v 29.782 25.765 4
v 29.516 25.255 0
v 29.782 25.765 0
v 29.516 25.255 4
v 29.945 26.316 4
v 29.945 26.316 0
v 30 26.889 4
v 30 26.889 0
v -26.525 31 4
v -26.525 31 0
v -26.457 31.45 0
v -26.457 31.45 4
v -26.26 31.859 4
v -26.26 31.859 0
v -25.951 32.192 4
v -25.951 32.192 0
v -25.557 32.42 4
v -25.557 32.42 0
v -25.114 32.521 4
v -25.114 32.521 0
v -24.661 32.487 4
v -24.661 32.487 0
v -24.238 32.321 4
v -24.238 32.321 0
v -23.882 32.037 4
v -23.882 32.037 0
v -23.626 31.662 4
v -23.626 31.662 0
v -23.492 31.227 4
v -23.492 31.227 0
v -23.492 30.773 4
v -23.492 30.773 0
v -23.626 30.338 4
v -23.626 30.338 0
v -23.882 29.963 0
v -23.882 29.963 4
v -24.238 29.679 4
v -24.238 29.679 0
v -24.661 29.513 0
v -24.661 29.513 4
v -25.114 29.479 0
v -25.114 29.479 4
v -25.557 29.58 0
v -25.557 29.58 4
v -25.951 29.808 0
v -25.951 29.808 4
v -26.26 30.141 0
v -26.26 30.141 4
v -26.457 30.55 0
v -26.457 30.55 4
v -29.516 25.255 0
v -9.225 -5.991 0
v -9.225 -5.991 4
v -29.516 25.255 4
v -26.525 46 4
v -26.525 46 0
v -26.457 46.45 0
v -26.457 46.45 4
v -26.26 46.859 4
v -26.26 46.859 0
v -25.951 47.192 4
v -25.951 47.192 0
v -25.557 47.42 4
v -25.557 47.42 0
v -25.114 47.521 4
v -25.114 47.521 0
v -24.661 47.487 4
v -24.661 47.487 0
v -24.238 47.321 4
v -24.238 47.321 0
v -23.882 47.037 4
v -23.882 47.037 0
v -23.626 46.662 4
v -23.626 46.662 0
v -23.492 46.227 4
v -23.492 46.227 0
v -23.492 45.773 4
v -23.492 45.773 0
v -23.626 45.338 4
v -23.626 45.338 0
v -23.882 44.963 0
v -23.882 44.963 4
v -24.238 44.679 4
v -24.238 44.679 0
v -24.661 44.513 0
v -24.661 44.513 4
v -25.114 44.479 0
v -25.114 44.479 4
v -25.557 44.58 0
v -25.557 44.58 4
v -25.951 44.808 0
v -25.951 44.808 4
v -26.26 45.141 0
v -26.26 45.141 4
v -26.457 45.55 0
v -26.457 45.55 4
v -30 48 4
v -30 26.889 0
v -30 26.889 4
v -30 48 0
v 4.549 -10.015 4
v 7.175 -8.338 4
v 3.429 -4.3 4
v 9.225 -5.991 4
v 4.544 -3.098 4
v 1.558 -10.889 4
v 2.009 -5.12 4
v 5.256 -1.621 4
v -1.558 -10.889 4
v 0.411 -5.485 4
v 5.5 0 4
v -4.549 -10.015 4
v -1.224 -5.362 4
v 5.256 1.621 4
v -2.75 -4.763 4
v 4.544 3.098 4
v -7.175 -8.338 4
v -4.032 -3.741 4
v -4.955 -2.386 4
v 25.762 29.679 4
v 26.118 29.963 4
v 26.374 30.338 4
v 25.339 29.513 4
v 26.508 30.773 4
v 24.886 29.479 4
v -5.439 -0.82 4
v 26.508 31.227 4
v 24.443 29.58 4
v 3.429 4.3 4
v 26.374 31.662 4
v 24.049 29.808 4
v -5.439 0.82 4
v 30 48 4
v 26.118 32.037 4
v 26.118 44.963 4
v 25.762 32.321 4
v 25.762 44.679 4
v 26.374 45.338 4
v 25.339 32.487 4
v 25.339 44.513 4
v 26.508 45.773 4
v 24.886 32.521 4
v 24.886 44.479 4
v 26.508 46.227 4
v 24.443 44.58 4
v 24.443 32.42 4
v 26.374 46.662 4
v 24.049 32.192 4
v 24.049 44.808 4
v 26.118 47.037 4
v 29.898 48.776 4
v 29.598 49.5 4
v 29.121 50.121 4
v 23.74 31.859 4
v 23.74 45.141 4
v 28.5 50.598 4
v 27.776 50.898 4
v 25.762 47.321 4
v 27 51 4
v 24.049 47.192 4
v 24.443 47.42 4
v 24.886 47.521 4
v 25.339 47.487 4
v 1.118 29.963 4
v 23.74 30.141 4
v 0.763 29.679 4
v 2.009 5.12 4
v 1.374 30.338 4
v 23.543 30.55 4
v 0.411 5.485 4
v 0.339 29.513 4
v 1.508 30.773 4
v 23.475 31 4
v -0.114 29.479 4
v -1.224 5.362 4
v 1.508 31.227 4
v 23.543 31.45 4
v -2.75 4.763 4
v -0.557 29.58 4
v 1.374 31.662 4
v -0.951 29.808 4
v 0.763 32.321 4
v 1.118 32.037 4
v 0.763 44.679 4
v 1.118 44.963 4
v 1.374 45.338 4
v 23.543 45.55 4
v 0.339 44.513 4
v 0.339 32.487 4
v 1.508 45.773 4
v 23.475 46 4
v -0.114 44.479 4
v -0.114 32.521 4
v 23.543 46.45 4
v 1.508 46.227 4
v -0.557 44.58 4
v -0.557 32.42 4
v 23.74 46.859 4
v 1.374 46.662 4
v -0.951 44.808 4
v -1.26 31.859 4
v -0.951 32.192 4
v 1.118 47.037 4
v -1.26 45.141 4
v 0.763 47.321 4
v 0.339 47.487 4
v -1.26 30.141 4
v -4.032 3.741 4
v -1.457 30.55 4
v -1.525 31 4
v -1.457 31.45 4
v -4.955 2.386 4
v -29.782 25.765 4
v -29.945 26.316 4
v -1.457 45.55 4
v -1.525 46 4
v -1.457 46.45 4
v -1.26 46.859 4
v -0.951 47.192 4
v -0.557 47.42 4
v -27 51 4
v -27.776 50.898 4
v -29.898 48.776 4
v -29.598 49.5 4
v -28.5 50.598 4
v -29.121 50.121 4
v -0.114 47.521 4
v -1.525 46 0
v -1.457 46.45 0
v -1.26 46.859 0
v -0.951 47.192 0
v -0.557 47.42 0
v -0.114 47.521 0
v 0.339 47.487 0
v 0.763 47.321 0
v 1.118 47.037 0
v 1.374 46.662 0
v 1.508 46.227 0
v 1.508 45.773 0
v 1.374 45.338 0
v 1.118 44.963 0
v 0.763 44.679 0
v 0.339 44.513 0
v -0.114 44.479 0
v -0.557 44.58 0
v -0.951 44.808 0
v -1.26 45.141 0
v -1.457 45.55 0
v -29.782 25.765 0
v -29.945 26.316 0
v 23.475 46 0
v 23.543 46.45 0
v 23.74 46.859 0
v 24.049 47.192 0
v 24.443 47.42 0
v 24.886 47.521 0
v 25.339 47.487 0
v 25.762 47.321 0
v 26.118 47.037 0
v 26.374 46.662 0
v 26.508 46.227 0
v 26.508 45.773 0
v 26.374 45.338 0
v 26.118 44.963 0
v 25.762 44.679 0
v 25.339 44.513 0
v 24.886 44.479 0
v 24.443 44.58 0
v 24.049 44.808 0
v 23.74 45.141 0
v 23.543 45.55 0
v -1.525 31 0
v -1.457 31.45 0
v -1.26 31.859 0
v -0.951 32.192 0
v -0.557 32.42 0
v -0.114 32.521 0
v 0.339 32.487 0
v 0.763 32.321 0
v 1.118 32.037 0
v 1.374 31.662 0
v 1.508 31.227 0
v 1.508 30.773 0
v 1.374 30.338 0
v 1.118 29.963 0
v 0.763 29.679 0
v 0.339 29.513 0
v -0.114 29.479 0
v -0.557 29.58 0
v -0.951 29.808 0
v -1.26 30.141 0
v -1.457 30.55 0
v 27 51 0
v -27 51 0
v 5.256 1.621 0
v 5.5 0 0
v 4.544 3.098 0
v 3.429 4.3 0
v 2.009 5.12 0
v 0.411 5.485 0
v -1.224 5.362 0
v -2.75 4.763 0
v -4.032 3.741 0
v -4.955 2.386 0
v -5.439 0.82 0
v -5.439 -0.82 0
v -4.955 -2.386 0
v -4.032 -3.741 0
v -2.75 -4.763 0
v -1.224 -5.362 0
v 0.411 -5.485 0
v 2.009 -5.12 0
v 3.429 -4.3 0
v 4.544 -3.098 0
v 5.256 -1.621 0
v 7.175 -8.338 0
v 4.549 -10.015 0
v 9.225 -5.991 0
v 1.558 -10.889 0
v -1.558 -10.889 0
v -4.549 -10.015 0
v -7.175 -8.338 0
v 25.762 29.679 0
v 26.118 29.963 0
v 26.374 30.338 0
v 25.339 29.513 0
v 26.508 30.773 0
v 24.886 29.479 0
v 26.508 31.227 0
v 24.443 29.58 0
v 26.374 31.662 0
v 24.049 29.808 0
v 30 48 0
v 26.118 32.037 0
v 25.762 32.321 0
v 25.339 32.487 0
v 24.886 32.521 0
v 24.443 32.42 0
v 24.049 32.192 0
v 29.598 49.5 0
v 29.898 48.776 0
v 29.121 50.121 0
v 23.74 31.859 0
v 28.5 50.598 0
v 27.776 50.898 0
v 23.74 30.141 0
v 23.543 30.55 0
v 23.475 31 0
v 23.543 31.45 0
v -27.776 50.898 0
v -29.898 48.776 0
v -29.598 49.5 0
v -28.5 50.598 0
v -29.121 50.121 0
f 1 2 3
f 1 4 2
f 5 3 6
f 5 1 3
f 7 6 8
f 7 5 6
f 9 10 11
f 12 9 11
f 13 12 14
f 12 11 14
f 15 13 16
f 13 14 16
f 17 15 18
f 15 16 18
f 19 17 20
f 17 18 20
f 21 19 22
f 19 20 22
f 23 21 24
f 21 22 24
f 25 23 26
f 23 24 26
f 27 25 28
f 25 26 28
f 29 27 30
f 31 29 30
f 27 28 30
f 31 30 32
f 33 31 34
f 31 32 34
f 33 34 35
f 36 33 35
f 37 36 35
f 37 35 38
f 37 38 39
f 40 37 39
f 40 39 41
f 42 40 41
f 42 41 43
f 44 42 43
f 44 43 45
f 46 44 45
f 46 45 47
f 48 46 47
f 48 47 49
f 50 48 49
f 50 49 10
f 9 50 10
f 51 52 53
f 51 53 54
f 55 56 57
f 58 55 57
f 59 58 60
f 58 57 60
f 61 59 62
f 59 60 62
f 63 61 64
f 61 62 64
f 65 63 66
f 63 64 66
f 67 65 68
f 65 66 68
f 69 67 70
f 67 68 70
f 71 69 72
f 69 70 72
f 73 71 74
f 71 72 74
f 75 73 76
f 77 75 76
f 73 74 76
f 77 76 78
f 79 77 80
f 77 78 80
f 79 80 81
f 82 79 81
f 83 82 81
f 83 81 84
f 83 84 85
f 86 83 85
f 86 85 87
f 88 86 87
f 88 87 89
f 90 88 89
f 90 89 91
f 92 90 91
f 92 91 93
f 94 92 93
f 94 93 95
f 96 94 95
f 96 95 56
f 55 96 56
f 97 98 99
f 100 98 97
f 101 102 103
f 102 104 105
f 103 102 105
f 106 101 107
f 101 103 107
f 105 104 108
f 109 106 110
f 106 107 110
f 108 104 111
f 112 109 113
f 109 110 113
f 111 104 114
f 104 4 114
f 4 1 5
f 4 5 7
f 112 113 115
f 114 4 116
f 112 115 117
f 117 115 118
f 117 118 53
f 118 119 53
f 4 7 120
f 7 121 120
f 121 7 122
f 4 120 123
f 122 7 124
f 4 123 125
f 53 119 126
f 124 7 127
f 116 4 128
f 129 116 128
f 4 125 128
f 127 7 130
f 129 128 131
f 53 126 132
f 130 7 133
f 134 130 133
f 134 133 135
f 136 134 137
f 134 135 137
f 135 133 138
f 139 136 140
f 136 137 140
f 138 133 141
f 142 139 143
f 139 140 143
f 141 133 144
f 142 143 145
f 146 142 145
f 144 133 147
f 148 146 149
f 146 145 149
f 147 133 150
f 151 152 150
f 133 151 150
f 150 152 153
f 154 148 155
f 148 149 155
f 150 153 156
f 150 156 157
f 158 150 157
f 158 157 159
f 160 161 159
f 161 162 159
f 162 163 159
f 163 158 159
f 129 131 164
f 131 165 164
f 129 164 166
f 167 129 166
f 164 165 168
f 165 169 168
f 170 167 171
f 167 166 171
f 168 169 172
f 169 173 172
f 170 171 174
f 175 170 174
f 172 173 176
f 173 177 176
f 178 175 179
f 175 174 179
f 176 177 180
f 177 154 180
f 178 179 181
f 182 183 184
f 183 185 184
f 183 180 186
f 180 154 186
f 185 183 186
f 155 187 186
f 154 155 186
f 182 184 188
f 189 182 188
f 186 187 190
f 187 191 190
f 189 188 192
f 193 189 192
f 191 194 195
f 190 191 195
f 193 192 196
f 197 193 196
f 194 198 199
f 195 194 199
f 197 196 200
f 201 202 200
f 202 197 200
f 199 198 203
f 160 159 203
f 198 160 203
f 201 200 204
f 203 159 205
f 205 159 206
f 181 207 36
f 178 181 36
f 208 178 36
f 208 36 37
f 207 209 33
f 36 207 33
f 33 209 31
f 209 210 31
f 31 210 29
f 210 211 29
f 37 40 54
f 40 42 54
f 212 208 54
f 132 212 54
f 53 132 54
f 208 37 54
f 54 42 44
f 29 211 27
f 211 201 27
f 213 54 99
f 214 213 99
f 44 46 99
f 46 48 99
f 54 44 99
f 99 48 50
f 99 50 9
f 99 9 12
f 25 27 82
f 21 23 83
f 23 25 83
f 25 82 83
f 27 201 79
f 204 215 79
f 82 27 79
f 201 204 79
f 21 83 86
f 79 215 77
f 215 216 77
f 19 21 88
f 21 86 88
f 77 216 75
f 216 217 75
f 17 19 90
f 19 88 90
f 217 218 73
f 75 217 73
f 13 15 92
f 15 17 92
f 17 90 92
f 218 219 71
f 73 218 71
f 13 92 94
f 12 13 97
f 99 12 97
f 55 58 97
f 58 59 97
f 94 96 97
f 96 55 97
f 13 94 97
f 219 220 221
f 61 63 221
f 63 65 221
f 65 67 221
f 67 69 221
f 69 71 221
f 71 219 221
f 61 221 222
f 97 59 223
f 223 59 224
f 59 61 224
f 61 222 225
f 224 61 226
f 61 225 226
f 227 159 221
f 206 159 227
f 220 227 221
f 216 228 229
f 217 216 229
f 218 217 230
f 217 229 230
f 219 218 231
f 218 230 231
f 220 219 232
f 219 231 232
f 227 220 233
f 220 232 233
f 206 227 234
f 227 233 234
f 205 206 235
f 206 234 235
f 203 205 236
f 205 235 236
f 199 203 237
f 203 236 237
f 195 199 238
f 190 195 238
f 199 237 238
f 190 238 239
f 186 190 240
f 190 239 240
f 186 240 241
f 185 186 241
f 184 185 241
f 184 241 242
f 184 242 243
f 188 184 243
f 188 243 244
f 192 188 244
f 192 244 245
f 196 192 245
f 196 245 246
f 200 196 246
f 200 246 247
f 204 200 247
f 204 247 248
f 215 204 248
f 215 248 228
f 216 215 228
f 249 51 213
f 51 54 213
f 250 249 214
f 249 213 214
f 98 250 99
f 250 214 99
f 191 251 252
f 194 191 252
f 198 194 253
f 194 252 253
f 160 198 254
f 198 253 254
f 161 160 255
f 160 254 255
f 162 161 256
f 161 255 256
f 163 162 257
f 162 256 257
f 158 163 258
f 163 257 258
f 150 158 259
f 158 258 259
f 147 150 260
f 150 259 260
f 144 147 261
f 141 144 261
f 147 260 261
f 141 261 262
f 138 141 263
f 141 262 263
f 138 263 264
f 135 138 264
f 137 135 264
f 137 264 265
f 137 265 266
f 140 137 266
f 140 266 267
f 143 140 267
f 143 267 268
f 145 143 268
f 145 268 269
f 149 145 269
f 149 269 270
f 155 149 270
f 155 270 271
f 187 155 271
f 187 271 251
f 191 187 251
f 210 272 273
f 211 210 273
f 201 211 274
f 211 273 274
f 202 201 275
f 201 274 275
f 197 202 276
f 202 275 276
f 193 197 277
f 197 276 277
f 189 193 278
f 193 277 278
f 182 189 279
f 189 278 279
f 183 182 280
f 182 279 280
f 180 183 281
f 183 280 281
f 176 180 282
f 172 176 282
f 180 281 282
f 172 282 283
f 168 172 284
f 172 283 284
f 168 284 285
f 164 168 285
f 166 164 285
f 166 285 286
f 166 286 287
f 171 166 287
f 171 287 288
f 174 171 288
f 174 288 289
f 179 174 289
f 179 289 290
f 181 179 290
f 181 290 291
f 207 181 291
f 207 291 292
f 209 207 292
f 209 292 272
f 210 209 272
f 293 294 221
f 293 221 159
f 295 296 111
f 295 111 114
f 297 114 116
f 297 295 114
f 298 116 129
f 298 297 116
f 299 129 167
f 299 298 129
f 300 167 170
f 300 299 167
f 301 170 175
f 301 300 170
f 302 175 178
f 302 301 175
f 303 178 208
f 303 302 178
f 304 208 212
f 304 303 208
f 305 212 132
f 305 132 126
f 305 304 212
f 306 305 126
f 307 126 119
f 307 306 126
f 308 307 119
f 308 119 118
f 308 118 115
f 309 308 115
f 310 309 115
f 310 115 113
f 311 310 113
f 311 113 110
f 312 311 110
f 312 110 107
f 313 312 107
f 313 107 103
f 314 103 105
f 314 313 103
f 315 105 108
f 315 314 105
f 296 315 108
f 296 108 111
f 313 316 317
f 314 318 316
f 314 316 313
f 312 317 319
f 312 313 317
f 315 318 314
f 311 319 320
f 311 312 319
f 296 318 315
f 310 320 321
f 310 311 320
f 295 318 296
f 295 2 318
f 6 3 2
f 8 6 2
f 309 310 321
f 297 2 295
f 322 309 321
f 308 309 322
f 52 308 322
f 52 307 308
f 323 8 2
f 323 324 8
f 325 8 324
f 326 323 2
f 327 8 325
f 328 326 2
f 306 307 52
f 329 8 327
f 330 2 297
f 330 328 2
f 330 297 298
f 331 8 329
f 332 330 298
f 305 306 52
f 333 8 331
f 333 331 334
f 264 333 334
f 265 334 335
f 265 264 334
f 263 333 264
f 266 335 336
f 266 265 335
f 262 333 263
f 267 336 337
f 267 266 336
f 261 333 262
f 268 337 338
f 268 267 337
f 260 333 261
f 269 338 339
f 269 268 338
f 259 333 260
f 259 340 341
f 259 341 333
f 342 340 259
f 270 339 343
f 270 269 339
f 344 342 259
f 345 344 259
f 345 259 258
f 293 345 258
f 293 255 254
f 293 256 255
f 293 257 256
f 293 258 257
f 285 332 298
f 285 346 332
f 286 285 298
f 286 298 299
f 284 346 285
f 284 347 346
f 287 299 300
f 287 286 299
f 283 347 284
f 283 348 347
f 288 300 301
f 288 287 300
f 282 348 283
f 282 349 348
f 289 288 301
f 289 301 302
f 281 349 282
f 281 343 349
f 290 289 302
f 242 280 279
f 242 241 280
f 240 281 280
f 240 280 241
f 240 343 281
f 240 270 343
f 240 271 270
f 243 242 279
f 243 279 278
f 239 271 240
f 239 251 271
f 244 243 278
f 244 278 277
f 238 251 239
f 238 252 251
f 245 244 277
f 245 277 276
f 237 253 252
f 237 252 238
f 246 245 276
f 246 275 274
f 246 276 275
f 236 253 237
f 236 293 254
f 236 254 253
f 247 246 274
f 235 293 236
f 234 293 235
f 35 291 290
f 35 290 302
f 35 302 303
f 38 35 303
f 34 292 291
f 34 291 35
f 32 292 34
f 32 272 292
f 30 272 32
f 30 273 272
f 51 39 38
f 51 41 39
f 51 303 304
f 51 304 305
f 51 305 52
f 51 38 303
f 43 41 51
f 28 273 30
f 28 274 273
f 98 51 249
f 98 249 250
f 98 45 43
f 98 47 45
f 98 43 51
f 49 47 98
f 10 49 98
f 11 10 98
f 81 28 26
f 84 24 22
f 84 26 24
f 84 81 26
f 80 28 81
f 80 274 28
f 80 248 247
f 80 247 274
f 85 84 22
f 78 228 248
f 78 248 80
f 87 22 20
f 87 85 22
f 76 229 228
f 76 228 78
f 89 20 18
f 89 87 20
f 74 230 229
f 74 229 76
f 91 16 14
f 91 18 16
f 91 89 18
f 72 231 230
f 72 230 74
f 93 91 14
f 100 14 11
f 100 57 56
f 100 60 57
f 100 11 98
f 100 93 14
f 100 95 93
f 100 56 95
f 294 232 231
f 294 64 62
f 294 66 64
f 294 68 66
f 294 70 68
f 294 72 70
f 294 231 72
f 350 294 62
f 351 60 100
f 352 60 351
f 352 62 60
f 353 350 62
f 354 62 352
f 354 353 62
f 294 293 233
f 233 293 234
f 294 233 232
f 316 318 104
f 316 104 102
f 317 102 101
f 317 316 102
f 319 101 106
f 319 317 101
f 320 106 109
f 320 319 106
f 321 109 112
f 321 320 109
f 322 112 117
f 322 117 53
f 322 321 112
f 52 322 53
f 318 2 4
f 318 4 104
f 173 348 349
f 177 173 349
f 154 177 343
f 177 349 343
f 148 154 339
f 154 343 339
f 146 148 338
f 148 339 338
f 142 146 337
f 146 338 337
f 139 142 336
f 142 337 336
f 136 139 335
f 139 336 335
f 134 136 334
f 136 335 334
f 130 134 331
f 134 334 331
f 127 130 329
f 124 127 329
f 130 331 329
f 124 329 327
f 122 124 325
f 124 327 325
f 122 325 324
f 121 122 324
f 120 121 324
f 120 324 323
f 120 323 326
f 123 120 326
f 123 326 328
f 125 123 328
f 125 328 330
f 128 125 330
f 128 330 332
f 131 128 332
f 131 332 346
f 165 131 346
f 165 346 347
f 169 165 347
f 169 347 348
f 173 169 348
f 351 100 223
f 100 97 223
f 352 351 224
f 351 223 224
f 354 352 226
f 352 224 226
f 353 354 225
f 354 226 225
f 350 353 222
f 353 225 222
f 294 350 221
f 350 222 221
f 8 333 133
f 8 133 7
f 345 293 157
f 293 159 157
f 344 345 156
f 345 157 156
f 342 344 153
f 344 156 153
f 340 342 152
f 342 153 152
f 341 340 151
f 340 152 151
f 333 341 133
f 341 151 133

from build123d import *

# Parameters (mm, degrees)
SKETCH_1_R          = 5.5
EXTRUDE_1_DEPTH     = 4
FILLET_1_R          = 3
SKETCH_3_R          = 1.525
CUT_EXTRUDE_2_DEPTH = 10


with BuildPart() as part:
    # 草图1 → 凸台-拉伸1 (new body)
    with BuildSketch(Plane.XY):
        with BuildLine():
            Line((-9.225454443, -5.990908973), (-30, 26))
            Line((-30, 26), (-30, 51))
            Line((-30, 51), (30, 51))
            Line((30, 51), (30, 26))
            Line((30, 26), (9.225454443, -5.990908973))
            ThreePointArc((9.225454443, -5.990908973), (0, -11), (-9.225454443, -5.990908973))
        make_face()
        Circle(SKETCH_1_R, mode=Mode.SUBTRACT)
    extrude(amount=EXTRUDE_1_DEPTH)

    # 圆角1
    fillet_1_edges = [part.edges().sort_by_distance(p)[0] for p in [
        (-30, 26, 2),
        (-30, 51, 2),
        (30, 51, 2),
        (30, 26, 2),
    ]]
    fillet(fillet_1_edges, radius=FILLET_1_R)

    # 草图3 → 切除-拉伸2 (cut)
    with BuildSketch(Plane(origin=(0, 0, 0), x_dir=(-1, 0, 0), z_dir=(0, 0, -1))):
        with Locations((25, 31)):
            Circle(SKETCH_3_R)
        with Locations((25, 46)):
            Circle(SKETCH_3_R)
        with Locations((0, 31)):
            Circle(SKETCH_3_R)
        with Locations((0, 46)):
            Circle(SKETCH_3_R)
        with Locations((-25, 31)):
            Circle(SKETCH_3_R)
        with Locations((-25, 46)):
            Circle(SKETCH_3_R)
    extrude(amount=-CUT_EXTRUDE_2_DEPTH, mode=Mode.SUBTRACT)


solid = part.part
